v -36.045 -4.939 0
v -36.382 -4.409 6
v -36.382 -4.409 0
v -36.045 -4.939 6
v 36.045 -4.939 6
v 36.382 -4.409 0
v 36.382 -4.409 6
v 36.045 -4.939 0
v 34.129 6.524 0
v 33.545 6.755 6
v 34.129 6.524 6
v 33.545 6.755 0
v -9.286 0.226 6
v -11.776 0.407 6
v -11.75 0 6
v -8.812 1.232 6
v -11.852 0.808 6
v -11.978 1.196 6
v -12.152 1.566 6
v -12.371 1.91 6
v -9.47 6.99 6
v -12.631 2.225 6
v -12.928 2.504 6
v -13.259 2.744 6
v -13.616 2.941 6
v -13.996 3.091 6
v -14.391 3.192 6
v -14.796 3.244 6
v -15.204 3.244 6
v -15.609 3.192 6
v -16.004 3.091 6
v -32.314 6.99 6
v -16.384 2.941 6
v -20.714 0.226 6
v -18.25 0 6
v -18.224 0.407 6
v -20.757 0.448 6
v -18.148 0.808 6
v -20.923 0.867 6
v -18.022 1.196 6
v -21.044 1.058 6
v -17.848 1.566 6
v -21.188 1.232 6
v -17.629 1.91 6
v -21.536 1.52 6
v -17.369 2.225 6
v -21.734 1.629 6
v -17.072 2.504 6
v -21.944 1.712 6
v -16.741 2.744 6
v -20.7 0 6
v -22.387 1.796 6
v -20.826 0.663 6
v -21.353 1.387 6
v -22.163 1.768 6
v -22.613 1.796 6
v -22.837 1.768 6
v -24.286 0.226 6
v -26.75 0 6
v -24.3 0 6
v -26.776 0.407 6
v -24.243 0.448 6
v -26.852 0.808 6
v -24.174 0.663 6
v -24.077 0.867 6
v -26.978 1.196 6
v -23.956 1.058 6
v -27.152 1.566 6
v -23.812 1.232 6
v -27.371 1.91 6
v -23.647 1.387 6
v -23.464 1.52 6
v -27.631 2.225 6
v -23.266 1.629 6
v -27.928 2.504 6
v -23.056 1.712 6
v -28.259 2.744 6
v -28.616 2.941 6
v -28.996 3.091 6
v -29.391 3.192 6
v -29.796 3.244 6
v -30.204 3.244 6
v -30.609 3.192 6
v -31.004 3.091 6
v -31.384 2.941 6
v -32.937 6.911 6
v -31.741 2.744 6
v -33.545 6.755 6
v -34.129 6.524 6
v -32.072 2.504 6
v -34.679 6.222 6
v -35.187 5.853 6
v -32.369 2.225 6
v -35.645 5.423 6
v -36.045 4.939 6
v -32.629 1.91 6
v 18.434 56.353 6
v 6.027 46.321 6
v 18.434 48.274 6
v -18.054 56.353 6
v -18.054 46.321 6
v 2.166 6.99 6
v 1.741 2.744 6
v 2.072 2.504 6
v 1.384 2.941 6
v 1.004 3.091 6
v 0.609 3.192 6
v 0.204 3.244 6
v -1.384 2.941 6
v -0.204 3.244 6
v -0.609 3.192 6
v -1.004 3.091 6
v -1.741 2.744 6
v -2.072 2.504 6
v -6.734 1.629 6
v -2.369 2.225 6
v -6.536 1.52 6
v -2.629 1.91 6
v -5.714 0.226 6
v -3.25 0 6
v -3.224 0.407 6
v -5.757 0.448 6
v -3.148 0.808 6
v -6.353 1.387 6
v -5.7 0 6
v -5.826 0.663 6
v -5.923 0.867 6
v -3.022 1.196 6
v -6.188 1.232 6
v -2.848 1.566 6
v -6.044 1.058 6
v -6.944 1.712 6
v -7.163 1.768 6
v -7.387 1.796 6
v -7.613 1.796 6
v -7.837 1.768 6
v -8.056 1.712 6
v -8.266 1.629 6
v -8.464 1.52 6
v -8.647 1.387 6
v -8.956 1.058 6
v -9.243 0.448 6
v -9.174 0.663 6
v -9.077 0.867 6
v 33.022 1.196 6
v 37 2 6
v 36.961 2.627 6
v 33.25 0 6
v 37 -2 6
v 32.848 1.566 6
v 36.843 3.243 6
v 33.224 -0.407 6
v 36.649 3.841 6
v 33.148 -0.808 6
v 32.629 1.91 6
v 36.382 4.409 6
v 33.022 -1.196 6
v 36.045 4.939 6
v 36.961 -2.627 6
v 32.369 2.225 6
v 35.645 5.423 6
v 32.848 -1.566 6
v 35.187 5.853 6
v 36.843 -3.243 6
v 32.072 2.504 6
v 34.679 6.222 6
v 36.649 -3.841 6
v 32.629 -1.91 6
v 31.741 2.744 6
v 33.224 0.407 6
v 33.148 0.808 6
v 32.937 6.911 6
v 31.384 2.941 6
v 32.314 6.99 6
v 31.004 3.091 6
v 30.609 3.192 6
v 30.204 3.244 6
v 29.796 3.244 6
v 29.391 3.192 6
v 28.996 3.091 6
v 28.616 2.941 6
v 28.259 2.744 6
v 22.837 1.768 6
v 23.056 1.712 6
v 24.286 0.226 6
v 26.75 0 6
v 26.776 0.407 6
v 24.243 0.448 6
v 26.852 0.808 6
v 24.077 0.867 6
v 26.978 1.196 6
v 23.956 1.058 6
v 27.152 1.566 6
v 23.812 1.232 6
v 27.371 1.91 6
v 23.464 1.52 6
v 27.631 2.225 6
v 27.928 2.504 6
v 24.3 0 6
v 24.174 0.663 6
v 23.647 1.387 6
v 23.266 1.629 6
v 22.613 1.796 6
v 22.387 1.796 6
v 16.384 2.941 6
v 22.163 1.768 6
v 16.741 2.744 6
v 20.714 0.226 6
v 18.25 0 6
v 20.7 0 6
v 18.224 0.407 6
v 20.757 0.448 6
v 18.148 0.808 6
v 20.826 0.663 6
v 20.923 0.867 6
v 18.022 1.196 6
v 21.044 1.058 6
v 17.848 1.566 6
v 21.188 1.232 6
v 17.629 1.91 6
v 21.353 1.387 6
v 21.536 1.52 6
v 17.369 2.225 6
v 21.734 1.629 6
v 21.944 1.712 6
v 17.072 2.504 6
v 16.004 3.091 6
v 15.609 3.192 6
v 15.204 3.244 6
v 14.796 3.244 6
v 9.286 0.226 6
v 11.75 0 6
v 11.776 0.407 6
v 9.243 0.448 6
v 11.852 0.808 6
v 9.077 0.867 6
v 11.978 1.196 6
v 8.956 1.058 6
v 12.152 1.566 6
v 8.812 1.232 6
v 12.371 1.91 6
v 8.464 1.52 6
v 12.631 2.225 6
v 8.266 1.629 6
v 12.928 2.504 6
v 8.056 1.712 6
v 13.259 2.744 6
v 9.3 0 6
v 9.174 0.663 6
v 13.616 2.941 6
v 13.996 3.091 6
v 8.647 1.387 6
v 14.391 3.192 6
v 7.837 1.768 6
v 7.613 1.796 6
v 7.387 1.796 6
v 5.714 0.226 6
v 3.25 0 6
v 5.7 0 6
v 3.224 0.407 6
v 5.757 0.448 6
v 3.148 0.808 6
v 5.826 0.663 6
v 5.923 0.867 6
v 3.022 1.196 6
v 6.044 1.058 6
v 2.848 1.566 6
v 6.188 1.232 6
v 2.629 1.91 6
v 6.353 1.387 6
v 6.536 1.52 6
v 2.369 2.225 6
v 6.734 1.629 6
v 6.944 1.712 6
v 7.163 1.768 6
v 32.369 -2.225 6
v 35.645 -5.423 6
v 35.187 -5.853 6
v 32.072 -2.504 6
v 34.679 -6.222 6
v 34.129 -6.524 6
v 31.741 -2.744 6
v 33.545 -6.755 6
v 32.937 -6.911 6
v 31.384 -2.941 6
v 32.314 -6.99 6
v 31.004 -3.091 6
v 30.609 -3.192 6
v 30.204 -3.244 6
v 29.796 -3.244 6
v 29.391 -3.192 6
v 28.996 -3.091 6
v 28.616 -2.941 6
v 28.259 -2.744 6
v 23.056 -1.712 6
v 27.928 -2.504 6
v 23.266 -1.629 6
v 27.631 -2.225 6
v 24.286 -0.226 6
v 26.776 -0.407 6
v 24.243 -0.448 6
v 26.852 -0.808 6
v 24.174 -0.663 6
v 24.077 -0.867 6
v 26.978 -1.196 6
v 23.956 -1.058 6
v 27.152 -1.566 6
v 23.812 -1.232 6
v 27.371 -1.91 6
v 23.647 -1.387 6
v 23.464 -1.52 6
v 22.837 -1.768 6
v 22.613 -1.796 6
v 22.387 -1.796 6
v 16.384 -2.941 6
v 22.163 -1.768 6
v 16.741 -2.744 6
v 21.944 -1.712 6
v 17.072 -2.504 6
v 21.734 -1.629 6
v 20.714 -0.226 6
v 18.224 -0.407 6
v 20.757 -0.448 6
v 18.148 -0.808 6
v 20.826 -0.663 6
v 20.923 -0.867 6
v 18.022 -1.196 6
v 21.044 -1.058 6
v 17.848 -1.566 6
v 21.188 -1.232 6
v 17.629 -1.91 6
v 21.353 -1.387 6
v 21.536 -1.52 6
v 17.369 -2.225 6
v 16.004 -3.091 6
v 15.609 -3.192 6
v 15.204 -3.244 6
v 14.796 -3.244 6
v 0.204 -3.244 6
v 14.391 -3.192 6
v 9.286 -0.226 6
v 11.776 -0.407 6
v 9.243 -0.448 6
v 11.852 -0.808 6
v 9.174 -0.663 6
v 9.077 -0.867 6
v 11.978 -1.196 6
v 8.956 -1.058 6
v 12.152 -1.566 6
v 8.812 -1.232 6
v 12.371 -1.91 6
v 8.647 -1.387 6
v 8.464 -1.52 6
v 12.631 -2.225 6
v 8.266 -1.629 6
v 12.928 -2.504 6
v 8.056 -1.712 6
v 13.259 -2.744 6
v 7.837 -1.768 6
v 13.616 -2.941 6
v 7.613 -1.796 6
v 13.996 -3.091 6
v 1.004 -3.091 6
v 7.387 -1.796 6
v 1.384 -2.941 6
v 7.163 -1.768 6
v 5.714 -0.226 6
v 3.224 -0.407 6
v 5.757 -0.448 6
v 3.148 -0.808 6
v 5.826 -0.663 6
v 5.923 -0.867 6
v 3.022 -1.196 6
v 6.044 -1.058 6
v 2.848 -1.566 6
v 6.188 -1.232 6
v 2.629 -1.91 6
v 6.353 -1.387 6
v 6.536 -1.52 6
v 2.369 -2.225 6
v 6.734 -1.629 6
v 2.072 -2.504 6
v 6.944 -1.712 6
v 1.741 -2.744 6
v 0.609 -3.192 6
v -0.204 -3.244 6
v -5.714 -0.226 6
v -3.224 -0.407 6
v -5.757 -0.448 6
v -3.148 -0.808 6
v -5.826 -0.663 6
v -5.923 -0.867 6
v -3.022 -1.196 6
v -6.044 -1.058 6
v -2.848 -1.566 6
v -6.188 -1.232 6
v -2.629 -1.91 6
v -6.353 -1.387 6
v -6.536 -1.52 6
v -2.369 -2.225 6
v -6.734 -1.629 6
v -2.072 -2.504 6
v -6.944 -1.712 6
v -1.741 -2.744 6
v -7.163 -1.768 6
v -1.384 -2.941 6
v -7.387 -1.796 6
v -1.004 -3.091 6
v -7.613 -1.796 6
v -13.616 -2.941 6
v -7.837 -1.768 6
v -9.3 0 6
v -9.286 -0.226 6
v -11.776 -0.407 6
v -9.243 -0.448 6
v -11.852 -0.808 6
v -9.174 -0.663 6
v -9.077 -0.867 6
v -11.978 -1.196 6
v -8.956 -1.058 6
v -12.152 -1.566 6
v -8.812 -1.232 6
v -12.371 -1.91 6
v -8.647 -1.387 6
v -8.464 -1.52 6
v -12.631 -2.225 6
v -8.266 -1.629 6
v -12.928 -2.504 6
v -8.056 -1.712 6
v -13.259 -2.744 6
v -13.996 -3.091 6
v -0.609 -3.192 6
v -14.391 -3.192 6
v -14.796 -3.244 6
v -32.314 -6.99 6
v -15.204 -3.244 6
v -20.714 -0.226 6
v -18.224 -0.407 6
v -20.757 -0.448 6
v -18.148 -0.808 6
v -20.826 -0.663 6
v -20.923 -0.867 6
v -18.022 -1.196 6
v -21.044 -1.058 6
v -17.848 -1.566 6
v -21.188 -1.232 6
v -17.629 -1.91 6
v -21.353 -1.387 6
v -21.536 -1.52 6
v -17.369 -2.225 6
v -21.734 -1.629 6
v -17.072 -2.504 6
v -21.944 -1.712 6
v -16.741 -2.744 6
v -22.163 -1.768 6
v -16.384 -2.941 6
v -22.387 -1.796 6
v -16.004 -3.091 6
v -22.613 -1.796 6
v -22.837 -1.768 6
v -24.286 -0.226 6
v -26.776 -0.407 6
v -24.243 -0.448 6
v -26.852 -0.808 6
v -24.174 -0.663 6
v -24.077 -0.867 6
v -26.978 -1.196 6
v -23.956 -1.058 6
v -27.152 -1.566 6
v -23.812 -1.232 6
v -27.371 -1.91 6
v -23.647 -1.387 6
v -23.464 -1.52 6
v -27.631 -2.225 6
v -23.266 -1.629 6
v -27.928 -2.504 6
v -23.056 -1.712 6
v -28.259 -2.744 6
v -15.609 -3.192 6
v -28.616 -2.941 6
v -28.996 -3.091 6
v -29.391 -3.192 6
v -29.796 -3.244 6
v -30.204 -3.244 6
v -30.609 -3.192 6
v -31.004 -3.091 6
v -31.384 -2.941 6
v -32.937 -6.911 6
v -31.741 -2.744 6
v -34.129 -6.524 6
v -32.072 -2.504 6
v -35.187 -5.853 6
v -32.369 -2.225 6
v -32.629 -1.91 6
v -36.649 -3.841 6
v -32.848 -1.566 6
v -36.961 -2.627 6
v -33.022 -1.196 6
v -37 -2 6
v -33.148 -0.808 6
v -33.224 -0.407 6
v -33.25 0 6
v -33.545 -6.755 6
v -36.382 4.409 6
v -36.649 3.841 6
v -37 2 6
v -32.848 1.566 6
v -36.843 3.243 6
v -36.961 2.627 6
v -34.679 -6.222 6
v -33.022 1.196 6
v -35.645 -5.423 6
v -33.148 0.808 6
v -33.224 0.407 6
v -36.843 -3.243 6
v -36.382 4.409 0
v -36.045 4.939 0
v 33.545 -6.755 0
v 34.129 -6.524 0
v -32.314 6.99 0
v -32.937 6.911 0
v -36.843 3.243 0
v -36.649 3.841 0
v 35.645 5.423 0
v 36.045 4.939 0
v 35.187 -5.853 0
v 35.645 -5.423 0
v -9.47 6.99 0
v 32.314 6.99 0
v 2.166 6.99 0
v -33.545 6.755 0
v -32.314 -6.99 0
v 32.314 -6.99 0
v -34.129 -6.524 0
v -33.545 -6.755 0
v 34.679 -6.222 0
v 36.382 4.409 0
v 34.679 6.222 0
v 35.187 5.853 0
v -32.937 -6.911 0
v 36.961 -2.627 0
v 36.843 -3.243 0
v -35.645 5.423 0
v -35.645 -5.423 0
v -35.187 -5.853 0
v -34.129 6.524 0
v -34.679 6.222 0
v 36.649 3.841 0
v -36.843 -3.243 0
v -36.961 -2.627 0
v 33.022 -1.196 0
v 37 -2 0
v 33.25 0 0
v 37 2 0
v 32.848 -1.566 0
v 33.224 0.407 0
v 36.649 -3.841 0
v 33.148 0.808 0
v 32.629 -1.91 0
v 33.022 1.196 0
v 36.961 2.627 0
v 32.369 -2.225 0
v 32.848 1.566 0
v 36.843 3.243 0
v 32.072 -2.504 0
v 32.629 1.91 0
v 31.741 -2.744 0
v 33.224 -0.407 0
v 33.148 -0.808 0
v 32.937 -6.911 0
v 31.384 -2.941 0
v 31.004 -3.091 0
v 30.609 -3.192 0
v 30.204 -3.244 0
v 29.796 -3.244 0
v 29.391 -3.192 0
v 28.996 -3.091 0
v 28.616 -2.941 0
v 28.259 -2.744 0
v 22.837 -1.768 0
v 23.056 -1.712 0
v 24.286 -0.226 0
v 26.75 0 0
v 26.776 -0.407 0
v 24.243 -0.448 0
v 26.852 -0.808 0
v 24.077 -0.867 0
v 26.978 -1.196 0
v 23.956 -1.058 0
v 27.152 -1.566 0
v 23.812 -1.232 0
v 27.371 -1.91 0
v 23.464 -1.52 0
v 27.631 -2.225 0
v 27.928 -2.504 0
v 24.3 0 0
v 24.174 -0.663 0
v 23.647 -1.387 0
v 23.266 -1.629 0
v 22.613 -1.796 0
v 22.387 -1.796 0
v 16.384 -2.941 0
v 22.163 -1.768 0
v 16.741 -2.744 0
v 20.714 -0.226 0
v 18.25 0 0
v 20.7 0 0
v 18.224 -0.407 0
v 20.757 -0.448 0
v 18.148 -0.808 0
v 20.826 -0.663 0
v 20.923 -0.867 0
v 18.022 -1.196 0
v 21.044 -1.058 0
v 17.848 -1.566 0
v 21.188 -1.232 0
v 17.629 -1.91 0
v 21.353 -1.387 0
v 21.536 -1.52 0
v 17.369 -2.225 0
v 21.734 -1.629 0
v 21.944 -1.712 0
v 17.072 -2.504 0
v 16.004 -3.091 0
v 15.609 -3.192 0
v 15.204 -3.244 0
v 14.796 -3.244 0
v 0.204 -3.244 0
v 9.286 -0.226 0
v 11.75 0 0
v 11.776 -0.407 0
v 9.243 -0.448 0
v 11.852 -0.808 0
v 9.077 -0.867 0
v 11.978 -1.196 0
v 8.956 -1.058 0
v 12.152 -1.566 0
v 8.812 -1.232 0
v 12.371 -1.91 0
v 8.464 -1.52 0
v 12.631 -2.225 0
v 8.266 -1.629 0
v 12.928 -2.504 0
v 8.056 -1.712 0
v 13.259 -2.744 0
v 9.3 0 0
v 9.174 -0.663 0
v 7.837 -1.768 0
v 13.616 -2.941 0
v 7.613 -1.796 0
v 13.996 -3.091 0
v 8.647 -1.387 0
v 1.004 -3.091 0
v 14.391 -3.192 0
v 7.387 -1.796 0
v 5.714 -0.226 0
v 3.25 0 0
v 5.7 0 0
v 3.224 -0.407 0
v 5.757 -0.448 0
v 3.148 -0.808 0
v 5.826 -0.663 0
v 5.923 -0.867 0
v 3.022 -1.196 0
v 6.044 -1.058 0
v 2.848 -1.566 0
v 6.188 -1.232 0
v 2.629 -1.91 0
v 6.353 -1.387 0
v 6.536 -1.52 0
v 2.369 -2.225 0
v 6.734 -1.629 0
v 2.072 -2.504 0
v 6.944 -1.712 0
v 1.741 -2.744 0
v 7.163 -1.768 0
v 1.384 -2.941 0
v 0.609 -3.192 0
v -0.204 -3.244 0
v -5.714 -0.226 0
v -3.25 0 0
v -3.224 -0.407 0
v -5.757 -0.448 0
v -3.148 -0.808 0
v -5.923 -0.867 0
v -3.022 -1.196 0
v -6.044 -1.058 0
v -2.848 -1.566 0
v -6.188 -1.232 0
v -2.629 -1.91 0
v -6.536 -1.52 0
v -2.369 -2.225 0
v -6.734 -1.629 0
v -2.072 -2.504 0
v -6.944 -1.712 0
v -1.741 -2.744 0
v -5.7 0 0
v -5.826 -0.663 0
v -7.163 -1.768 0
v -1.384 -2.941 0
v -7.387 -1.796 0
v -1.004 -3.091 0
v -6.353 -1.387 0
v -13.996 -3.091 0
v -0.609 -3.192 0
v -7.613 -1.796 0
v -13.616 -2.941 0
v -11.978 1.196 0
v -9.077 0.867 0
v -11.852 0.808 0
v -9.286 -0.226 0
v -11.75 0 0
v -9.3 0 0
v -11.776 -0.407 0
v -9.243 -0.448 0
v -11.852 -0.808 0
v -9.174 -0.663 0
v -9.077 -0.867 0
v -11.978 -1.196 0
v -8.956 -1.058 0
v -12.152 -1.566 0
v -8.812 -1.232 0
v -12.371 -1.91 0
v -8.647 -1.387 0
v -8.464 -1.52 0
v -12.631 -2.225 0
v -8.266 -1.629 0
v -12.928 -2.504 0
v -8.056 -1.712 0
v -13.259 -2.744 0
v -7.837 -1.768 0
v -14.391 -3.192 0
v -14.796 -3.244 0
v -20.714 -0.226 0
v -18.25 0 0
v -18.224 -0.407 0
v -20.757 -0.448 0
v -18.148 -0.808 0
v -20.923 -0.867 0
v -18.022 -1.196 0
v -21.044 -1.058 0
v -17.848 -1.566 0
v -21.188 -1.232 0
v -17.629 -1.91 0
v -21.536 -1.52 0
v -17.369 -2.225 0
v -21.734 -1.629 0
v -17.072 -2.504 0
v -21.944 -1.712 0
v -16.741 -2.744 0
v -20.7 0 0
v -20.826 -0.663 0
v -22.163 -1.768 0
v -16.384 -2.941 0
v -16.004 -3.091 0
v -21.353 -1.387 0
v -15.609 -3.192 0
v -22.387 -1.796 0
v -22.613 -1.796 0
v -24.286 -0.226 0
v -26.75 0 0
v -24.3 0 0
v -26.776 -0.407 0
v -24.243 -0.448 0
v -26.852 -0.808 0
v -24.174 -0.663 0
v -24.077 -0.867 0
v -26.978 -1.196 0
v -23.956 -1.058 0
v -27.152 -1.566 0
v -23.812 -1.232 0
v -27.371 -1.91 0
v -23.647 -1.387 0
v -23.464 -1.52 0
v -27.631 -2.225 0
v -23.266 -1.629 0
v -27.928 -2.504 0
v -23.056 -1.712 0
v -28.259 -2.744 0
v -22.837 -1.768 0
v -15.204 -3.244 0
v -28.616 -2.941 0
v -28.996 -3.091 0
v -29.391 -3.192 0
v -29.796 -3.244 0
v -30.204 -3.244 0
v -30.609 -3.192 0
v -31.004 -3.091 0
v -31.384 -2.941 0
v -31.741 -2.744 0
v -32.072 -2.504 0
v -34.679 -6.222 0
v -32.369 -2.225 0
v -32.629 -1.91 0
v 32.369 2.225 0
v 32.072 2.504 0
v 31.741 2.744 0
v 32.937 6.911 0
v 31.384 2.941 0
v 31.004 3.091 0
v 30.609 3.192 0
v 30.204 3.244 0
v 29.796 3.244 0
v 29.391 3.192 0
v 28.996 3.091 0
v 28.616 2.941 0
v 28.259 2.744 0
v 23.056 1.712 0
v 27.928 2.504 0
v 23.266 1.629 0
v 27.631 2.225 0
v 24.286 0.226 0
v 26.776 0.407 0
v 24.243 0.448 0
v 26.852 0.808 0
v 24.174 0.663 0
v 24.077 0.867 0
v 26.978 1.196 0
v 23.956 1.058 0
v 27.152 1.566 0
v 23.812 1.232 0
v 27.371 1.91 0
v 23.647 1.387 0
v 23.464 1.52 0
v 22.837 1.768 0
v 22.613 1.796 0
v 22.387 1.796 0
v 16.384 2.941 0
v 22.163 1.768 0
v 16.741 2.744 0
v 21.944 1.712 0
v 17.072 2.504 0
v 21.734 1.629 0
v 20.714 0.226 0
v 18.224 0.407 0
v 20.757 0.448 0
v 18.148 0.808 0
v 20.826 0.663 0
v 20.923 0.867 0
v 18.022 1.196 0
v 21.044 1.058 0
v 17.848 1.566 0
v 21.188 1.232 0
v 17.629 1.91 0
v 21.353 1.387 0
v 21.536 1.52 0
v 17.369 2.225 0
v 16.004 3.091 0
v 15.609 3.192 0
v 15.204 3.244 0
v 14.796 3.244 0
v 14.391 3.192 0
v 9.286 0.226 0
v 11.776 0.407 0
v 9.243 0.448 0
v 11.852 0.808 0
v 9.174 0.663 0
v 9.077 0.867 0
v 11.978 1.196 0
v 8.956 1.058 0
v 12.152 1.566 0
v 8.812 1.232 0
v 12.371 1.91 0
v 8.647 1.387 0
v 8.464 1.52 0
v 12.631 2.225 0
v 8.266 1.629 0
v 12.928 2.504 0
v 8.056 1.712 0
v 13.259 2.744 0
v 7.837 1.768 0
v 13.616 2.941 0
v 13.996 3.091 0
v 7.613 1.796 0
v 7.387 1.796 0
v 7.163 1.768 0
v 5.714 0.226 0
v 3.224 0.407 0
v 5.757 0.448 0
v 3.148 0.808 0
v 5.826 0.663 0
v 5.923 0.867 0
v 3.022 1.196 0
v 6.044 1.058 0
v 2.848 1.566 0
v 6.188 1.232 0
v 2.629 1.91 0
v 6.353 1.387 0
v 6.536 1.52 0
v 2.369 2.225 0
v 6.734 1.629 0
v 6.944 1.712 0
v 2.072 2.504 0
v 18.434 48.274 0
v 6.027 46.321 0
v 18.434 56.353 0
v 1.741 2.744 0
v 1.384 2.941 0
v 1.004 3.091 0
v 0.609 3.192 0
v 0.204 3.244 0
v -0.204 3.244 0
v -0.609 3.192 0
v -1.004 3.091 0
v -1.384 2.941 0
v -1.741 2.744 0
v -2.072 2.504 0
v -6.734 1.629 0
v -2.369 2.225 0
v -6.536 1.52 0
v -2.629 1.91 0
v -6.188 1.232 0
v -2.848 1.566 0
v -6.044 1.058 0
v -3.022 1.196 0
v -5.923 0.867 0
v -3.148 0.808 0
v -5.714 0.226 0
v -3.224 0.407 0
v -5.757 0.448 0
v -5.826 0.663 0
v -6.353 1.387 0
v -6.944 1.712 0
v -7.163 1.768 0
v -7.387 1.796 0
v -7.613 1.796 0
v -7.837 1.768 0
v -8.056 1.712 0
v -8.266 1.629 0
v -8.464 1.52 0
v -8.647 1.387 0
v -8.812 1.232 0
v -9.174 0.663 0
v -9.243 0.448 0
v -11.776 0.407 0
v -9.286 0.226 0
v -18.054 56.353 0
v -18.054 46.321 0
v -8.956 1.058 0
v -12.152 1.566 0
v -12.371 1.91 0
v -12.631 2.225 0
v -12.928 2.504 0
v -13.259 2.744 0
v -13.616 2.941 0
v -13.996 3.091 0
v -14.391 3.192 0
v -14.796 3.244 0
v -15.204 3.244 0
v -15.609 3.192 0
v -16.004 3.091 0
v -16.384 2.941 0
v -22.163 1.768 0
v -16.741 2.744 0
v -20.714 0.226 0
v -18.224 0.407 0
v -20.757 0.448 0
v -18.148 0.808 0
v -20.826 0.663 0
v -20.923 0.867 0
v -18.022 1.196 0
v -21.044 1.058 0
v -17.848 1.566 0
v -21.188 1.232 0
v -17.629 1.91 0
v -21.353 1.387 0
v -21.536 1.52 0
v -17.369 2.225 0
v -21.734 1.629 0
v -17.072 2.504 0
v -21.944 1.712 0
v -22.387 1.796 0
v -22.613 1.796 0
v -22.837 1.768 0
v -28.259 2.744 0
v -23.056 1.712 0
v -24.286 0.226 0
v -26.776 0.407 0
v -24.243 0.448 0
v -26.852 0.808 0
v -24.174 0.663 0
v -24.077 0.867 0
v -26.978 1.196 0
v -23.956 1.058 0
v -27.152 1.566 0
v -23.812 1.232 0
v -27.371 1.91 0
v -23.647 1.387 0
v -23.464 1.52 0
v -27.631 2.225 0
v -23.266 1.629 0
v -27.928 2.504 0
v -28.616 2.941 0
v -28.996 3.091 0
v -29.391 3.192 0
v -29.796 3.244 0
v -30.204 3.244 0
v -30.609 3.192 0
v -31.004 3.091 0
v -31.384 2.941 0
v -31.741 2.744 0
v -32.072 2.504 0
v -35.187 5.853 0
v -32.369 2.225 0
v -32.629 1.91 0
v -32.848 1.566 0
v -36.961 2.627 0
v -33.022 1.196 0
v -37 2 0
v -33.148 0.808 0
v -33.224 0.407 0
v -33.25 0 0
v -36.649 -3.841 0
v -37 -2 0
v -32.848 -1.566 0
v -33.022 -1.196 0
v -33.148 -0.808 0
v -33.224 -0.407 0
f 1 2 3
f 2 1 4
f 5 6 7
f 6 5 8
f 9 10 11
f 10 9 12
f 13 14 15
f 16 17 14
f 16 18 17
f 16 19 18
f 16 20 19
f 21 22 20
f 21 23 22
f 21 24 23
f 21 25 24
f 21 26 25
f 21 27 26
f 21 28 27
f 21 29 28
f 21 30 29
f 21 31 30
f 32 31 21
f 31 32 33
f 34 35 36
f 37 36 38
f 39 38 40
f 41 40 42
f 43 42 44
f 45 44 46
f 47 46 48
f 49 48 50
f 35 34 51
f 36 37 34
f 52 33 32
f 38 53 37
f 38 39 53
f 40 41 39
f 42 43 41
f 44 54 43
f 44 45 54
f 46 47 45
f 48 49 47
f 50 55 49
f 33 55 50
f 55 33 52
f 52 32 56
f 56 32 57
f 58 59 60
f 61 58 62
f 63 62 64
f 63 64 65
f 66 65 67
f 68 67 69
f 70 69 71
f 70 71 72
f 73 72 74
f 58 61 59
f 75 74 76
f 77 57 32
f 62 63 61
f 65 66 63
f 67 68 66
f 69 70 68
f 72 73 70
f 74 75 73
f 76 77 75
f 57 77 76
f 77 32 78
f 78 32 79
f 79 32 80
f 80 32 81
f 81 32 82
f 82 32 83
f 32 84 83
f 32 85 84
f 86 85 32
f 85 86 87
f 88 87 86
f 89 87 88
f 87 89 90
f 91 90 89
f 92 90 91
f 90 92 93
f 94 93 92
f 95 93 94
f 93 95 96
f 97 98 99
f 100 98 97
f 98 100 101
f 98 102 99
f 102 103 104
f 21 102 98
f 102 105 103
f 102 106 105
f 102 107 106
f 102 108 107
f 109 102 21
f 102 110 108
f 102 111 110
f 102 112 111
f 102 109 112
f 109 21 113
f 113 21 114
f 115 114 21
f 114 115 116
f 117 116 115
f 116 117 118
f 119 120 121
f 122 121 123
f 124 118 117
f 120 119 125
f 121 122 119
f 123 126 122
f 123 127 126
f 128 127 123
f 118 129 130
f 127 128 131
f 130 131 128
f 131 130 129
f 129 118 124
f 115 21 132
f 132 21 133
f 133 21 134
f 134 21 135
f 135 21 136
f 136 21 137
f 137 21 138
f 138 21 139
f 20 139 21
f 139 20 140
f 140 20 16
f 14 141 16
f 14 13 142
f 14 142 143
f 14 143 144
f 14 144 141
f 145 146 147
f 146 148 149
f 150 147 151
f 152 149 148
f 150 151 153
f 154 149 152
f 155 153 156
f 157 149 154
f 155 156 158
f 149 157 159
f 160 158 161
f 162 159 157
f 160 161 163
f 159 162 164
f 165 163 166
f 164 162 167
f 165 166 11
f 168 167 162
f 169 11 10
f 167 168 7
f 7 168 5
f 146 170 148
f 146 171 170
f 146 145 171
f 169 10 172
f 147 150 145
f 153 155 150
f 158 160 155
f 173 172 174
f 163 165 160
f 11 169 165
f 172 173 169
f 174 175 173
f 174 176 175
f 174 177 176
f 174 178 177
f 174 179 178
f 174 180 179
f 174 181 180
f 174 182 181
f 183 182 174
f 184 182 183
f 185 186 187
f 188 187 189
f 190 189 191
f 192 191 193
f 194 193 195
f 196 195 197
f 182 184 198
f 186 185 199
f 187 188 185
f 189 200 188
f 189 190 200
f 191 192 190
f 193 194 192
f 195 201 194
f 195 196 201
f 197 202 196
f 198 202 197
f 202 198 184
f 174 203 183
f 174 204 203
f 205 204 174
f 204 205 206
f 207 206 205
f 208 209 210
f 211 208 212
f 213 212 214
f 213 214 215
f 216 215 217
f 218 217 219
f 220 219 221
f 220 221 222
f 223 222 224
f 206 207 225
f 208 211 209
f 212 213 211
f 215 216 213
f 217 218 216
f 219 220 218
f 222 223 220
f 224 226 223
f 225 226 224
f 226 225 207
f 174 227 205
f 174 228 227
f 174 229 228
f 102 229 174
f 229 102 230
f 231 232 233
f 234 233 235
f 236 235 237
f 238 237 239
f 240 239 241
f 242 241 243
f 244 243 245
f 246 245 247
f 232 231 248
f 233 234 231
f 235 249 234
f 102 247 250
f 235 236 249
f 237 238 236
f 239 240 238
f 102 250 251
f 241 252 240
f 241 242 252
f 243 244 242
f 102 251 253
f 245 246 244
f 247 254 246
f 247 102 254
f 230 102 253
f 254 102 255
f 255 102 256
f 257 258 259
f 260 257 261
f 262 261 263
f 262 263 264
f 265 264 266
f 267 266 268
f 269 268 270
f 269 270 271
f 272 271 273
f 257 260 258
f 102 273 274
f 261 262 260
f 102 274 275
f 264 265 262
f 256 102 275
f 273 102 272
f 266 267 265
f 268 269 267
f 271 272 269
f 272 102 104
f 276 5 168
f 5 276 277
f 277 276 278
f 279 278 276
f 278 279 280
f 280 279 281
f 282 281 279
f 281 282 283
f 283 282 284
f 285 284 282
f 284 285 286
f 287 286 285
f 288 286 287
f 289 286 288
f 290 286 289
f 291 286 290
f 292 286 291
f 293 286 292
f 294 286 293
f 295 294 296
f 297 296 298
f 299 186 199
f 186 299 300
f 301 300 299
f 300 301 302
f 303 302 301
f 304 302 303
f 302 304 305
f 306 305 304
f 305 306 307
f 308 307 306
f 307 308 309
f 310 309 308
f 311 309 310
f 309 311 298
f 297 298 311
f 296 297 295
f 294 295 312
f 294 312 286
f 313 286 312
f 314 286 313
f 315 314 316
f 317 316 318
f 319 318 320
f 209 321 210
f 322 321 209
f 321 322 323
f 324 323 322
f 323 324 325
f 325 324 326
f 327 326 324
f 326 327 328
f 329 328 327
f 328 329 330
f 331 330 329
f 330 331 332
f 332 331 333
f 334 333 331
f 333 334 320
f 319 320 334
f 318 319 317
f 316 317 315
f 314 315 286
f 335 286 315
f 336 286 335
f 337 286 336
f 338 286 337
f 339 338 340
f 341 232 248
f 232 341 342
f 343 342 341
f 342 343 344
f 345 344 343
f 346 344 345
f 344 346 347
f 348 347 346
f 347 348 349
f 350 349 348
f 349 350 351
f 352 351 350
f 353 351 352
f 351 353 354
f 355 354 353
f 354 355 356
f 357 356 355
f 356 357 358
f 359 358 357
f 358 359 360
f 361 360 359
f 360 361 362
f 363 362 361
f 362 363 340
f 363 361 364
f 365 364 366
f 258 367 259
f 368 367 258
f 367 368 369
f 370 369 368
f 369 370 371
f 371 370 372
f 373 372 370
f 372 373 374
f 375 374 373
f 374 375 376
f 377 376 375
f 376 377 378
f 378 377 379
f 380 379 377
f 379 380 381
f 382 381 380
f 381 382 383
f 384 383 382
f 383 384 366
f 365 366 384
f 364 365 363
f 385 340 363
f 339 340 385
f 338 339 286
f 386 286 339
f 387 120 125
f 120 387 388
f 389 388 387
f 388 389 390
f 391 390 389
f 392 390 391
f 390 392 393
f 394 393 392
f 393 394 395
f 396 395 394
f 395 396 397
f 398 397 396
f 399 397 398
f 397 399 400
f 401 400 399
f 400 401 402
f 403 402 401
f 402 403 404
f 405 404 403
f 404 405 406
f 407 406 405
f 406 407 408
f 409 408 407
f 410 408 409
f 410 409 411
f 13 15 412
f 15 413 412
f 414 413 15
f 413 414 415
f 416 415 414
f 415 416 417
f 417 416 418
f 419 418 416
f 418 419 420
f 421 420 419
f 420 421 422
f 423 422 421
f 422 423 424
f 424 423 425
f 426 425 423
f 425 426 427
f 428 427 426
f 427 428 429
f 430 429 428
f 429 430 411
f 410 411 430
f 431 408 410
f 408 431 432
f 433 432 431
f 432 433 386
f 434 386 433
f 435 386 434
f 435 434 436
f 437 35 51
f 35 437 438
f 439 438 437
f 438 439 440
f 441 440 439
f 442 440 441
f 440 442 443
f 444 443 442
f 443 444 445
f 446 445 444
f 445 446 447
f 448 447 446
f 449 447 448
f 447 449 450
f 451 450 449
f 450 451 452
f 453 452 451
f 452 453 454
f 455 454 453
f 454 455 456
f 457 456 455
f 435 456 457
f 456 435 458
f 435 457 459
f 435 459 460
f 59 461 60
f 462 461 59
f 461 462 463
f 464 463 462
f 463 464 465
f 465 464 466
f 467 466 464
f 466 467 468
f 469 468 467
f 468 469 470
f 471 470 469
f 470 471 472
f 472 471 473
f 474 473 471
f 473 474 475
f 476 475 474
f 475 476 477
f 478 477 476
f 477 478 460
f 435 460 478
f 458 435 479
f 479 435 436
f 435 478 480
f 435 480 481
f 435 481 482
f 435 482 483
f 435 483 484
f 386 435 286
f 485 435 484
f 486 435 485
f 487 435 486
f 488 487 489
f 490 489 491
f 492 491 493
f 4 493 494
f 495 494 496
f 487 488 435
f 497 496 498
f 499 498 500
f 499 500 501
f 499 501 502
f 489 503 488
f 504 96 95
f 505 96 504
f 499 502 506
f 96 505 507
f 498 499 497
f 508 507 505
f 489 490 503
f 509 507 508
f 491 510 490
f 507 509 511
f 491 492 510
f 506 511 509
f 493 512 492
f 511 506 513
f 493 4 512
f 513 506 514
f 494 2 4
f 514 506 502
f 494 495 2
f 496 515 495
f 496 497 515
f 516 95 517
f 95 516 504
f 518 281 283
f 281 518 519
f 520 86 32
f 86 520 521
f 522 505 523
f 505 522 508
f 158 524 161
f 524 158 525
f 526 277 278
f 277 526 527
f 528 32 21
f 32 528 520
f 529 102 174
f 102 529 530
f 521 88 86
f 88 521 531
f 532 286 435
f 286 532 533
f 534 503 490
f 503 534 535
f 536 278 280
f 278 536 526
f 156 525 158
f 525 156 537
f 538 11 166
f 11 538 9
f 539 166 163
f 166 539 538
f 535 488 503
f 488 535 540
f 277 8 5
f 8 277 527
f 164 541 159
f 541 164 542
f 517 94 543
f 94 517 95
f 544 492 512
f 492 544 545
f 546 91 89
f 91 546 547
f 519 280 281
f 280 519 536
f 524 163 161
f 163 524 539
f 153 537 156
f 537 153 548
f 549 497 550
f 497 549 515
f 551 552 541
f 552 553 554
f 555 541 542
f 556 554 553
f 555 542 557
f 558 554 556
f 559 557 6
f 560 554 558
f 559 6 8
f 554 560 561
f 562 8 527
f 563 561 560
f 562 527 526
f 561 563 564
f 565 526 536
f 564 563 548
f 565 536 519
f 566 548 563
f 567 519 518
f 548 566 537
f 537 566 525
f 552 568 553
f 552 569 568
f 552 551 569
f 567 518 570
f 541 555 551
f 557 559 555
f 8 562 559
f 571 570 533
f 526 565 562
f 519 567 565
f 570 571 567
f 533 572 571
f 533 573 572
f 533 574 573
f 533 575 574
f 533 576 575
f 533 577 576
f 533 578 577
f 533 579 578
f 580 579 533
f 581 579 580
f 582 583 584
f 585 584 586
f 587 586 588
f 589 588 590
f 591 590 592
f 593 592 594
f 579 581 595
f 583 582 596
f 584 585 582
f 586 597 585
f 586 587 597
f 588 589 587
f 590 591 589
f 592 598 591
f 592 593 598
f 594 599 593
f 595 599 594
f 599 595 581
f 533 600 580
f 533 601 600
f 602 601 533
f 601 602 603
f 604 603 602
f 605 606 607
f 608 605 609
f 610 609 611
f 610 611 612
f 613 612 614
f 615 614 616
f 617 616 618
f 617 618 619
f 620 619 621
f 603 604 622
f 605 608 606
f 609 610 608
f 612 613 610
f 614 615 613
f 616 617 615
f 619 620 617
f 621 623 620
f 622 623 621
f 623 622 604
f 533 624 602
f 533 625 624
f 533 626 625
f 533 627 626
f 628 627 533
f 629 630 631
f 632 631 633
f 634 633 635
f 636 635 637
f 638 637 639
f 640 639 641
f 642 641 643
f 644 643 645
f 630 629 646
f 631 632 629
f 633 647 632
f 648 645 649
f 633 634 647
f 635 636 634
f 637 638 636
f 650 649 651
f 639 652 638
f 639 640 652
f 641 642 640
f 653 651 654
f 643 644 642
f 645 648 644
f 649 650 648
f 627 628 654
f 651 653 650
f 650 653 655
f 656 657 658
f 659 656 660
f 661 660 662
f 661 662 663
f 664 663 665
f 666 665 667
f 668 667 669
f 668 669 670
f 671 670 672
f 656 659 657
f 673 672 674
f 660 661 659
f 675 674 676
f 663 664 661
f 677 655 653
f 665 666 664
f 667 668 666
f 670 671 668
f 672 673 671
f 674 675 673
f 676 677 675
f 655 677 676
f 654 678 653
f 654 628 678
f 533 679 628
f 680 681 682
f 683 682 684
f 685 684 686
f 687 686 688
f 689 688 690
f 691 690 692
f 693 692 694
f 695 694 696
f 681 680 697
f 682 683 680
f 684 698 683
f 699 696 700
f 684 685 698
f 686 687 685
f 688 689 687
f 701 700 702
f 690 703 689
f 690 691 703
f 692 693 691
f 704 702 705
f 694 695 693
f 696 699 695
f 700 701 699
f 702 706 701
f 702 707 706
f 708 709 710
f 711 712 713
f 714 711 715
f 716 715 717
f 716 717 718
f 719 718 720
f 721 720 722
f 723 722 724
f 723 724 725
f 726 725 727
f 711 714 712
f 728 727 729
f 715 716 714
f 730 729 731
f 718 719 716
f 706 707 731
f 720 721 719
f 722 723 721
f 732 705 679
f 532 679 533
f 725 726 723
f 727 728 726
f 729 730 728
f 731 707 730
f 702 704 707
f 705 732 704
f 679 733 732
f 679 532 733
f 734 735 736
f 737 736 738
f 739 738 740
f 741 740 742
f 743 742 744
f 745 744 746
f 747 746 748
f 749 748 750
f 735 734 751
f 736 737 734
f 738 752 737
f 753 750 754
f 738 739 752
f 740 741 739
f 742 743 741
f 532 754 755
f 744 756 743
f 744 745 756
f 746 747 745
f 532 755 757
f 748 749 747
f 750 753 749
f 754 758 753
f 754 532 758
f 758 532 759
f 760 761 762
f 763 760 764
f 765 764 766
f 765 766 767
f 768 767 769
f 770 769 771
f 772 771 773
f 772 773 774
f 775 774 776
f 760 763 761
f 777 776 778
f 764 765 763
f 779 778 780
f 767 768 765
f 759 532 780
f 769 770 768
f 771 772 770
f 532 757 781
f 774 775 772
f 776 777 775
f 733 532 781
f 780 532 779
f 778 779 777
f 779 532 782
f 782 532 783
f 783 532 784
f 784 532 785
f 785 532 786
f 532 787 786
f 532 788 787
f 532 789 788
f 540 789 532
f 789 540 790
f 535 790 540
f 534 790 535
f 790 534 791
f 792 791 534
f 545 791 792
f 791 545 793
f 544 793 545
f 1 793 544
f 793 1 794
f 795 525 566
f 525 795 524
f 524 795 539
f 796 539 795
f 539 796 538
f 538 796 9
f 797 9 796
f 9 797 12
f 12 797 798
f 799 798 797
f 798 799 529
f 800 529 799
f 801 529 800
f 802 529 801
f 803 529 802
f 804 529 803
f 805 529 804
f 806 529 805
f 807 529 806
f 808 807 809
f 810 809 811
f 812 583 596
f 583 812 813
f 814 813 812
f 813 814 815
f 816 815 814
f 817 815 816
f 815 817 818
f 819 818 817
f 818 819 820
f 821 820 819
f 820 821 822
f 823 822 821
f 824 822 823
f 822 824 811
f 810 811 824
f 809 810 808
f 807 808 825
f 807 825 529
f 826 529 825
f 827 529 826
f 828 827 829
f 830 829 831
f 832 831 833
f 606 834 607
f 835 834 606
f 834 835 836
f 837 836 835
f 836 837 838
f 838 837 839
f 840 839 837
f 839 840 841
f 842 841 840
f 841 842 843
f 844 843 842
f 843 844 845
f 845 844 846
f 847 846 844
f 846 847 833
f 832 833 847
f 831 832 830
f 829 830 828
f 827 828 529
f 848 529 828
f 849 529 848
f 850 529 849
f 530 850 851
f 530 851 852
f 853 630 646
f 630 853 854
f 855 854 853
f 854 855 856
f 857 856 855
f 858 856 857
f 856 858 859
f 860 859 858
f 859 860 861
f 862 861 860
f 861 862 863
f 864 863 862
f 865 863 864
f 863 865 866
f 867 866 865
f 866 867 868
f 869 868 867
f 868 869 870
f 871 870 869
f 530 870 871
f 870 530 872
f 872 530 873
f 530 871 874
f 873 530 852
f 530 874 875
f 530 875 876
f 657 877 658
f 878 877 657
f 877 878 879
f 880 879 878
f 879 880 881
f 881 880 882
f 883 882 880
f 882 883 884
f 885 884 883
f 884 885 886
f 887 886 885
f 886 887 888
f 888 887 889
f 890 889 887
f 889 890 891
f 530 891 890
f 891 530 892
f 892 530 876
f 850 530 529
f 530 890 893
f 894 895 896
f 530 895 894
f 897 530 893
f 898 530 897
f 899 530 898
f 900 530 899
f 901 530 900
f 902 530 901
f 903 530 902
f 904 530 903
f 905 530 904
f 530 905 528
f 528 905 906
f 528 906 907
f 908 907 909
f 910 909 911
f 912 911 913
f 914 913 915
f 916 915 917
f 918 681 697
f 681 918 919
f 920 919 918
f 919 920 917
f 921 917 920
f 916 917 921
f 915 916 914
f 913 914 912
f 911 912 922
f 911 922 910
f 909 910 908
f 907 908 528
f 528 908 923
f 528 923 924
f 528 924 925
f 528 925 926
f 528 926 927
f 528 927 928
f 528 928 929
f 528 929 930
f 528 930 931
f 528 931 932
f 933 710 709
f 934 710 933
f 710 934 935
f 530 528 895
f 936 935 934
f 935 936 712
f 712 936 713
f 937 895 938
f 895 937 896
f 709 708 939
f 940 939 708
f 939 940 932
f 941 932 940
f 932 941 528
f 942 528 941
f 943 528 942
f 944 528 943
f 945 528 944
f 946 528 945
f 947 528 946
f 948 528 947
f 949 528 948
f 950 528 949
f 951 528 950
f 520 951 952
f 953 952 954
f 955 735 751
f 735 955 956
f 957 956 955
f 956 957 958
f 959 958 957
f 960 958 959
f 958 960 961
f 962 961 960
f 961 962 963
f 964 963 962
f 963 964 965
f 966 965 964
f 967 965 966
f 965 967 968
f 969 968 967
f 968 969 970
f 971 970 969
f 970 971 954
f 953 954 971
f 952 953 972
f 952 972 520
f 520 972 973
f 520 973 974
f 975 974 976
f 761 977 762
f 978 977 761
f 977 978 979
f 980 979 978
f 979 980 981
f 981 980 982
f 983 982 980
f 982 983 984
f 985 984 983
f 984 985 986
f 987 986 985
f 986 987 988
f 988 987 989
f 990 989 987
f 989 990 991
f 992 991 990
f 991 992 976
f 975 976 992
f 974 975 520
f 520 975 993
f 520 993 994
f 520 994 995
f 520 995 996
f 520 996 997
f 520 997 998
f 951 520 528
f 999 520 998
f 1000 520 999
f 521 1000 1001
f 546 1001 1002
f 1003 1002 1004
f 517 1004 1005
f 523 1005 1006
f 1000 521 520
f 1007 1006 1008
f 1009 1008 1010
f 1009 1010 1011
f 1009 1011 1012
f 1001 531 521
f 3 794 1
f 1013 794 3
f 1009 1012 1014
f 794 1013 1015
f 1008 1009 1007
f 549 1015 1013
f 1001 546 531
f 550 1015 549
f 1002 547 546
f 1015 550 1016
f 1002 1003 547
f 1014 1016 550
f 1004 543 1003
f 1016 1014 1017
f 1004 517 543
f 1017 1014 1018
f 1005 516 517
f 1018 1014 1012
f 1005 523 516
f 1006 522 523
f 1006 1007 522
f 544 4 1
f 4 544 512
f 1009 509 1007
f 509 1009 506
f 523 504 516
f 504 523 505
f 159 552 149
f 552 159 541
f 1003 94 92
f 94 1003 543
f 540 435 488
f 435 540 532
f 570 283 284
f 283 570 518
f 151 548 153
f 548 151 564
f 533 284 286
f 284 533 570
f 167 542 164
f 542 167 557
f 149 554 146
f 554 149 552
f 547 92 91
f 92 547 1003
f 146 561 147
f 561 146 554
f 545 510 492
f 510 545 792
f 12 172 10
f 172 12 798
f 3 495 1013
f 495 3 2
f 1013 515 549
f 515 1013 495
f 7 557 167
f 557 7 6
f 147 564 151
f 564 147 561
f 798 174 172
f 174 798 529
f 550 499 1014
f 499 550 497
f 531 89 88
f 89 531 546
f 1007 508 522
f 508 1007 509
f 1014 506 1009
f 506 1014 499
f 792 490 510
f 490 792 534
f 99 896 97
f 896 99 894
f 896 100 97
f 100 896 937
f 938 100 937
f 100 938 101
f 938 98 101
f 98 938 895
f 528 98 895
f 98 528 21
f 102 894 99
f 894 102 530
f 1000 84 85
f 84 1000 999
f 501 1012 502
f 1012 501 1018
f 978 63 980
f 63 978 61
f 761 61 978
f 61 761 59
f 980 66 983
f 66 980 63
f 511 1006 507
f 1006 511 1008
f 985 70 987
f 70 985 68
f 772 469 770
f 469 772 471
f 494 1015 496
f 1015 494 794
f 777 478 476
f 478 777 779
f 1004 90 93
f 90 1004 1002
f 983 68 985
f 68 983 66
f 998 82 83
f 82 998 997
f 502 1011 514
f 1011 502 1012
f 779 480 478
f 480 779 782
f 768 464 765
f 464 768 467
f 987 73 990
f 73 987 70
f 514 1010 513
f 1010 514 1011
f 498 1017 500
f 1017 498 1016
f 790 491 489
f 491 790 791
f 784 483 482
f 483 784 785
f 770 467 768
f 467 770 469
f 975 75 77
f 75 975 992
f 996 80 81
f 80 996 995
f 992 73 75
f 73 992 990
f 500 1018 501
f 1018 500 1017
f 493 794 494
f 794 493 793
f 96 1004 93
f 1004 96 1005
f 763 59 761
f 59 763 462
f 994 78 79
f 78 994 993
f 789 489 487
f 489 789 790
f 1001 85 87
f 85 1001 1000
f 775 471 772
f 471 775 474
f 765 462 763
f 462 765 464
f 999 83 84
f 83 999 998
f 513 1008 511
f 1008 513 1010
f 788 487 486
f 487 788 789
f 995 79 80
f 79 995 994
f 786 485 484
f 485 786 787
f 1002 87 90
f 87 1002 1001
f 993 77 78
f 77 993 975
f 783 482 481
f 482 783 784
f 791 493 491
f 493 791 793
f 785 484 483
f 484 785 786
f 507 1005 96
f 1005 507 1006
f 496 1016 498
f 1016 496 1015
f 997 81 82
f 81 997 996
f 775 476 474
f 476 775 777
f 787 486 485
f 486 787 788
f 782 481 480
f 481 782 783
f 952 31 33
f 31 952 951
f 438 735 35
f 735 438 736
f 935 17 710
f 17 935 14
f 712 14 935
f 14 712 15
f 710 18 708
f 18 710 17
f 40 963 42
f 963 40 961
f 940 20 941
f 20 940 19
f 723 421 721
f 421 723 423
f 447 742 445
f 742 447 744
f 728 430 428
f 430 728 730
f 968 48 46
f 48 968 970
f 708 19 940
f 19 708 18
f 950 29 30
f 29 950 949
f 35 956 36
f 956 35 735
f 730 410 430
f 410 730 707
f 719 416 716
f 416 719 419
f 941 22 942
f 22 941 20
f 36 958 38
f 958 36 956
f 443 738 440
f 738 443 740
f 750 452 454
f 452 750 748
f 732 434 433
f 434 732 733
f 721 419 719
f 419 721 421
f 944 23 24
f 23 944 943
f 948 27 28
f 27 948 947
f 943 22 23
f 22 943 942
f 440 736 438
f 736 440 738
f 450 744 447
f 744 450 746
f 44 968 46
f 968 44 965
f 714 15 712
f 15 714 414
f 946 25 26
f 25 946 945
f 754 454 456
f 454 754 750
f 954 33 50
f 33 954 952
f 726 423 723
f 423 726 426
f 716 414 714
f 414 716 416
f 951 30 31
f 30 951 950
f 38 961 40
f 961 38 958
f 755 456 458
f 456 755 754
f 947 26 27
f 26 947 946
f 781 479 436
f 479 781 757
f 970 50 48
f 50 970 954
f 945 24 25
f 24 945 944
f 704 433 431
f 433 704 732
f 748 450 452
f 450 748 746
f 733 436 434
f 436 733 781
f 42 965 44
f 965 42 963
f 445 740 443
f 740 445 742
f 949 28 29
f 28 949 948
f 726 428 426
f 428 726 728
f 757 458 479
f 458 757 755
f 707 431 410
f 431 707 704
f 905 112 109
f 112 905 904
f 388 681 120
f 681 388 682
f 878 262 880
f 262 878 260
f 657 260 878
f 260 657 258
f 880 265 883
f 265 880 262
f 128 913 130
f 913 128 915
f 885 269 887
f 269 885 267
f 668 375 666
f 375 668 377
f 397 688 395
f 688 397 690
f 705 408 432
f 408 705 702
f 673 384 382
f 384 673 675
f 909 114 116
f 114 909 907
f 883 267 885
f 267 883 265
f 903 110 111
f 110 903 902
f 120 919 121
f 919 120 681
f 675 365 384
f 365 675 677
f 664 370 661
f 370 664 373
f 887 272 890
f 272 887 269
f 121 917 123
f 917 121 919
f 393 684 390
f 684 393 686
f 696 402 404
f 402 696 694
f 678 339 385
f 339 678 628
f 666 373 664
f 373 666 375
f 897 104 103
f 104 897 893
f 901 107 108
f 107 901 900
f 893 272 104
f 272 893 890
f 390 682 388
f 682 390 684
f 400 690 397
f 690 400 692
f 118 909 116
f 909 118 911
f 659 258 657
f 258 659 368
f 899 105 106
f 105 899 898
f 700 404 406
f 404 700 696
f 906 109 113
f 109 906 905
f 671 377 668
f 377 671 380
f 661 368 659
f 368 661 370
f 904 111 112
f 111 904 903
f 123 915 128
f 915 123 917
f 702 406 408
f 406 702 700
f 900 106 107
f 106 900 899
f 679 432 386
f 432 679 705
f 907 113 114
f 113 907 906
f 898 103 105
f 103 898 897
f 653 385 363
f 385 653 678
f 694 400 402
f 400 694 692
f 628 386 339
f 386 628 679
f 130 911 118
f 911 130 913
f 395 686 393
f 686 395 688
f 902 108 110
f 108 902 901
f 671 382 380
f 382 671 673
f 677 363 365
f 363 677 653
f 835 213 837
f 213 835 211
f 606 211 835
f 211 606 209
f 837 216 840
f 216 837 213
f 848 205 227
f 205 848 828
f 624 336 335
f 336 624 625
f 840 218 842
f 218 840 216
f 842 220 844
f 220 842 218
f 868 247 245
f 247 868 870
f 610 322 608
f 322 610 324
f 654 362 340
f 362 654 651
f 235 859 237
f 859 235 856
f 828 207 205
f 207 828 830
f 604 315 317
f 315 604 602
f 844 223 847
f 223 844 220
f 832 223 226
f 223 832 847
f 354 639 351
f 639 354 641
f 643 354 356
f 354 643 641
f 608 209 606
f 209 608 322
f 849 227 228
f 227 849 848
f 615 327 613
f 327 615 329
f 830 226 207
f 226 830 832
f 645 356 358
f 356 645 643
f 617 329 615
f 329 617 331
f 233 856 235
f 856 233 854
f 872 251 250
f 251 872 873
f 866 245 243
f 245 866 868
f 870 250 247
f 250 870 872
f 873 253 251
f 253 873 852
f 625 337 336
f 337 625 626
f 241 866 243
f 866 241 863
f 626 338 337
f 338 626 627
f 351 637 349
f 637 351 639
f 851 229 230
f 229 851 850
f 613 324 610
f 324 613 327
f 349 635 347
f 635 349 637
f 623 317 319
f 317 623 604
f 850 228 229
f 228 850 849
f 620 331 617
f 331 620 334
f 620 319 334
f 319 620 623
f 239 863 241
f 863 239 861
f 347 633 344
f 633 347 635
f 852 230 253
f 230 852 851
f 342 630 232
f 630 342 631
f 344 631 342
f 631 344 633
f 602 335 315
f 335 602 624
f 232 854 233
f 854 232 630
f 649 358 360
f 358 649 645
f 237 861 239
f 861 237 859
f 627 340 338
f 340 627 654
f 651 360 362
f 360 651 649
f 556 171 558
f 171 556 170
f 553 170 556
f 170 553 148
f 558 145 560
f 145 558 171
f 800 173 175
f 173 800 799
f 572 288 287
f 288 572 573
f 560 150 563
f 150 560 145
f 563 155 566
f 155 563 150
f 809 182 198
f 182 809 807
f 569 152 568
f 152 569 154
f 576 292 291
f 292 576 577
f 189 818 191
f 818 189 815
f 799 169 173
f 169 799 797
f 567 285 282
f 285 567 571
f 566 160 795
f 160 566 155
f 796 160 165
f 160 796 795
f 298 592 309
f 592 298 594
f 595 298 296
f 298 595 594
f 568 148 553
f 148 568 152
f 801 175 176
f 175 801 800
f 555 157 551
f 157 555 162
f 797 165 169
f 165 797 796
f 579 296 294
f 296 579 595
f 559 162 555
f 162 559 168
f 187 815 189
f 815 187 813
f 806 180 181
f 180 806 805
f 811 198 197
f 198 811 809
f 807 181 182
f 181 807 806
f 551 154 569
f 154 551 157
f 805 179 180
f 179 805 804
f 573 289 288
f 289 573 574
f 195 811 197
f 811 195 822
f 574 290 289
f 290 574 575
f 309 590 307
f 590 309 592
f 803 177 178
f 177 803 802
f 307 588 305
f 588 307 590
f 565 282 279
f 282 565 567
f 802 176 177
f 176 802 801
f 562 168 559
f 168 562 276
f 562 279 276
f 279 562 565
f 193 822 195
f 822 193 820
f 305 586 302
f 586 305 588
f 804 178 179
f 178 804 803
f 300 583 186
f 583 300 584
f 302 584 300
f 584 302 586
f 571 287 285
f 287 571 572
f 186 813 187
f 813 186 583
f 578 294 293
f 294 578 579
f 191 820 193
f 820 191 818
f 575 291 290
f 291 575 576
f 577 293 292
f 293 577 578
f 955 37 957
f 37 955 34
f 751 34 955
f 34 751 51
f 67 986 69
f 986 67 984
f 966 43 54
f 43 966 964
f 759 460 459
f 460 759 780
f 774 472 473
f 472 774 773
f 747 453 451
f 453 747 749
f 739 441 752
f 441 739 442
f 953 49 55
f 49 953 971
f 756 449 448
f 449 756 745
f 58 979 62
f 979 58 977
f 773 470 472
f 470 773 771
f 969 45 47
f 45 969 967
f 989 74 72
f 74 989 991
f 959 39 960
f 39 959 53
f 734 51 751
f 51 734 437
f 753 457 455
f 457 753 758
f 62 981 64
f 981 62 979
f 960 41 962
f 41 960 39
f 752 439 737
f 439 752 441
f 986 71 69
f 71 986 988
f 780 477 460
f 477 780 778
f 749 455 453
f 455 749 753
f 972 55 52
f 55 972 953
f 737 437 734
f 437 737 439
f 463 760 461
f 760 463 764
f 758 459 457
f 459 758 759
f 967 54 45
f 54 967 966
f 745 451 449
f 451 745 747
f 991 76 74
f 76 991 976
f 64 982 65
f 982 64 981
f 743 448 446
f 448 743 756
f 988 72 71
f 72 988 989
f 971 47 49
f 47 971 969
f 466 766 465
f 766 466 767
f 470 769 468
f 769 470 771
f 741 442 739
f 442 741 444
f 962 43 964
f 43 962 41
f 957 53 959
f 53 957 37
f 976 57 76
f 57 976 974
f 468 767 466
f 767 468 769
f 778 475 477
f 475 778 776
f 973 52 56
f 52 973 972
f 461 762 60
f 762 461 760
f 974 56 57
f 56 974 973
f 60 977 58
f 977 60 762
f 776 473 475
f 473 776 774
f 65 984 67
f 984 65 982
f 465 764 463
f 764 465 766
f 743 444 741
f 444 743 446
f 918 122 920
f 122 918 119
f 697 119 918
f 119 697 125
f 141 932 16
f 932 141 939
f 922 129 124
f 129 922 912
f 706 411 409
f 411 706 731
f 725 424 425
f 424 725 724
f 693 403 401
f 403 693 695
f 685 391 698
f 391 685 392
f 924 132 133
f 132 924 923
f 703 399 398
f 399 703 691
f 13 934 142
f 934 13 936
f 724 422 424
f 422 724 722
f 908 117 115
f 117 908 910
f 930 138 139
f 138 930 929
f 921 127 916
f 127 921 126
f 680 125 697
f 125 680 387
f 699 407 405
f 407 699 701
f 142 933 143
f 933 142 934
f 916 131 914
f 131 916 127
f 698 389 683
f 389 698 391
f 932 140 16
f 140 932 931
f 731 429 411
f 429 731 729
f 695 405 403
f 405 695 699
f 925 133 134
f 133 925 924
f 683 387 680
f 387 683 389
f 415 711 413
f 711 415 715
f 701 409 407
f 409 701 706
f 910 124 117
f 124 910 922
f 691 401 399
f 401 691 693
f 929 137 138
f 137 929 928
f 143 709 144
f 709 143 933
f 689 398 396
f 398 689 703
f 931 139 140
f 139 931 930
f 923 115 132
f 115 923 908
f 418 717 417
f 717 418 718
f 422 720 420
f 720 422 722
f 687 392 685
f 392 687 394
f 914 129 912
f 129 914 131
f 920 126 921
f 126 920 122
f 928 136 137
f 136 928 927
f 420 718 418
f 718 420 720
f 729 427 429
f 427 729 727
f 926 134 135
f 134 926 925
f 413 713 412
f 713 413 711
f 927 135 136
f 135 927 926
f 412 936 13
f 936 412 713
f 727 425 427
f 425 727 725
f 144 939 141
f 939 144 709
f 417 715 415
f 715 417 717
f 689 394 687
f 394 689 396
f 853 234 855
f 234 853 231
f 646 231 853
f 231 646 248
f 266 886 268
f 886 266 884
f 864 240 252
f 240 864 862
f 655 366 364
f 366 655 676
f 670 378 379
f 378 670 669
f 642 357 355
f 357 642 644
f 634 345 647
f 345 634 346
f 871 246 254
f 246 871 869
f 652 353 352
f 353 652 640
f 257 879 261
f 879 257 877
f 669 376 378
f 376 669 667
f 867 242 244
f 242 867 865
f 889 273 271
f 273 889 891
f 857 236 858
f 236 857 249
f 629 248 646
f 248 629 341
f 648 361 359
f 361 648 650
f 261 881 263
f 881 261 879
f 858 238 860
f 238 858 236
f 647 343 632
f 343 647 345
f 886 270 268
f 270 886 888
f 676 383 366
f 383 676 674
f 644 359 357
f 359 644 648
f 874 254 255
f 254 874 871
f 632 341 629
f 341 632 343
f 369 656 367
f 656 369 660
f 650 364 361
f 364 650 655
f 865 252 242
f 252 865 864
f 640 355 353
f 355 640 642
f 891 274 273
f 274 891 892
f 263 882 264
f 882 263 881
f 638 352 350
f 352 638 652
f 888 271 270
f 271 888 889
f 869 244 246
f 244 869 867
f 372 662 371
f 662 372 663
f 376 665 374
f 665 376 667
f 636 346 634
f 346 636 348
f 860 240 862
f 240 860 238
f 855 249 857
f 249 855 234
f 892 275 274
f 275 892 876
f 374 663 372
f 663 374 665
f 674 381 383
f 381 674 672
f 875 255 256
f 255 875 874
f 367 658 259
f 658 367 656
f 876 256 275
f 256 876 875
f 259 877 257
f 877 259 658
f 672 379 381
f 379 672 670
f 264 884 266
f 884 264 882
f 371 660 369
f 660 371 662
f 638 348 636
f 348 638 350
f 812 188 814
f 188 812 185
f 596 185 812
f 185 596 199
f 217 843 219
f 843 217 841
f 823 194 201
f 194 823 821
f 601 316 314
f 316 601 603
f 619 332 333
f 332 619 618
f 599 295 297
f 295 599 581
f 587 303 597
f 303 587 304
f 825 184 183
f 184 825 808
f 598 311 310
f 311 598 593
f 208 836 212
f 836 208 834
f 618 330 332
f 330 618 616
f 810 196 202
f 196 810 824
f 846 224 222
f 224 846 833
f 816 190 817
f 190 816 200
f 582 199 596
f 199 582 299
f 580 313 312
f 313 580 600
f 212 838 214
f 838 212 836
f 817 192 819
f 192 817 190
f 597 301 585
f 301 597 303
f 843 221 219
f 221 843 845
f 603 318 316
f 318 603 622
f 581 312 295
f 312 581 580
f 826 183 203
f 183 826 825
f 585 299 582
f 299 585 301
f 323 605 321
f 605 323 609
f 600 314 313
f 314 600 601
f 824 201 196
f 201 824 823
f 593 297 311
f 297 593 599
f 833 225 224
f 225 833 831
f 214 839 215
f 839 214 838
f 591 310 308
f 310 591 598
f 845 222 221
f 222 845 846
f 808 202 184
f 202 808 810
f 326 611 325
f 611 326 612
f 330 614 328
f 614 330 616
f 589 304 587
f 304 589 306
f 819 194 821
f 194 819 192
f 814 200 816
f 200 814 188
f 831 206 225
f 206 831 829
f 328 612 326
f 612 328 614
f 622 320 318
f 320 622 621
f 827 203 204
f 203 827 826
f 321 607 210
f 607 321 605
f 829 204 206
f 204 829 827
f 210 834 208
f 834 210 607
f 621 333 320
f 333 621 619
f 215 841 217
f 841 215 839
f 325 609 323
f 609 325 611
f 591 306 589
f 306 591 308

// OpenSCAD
$fn = 50;


difference() {
	union() {
		hull() {
			translate(v = [-32.0000000000, 2.0000000000, 0]) {
				cylinder(h = 6, r = 5);
			}
			translate(v = [32.0000000000, 2.0000000000, 0]) {
				cylinder(h = 6, r = 5);
			}
			translate(v = [-32.0000000000, -2.0000000000, 0]) {
				cylinder(h = 6, r = 5);
			}
			translate(v = [32.0000000000, -2.0000000000, 0]) {
				cylinder(h = 6, r = 5);
			}
		}
		translate(v = [0, 55, 0]) {
			linear_extrude(height = 6) {
				text(font = "DejaVu Sans Mono:style=Bold", halign = "center", size = 57.0000000000, text = "7", valign = "top");
			}
		}
	}
	union() {
		translate(v = [-30.0000000000, 0.0000000000, 0]) {
			translate(v = [0, 0, -100]) {
				cylinder(h = 200, r = 3.2500000000);
			}
		}
		translate(v = [-15.0000000000, 0.0000000000, 0]) {
			translate(v = [0, 0, -100]) {
				cylinder(h = 200, r = 3.2500000000);
			}
		}
		translate(v = [0, 0, -100]) {
			cylinder(h = 200, r = 3.2500000000);
		}
		translate(v = [15.0000000000, 0.0000000000, 0]) {
			translate(v = [0, 0, -100]) {
				cylinder(h = 200, r = 3.2500000000);
			}
		}
		translate(v = [30.0000000000, 0.0000000000, 0]) {
			translate(v = [0, 0, -100]) {
				cylinder(h = 200, r = 3.2500000000);
			}
		}
		translate(v = [-30.0000000000, 0.0000000000, 0]) {
			translate(v = [0, 0, -100]) {
				cylinder(h = 200, r = 1.8000000000);
			}
		}
		translate(v = [-22.5000000000, 0.0000000000, 0]) {
			translate(v = [0, 0, -100]) {
				cylinder(h = 200, r = 1.8000000000);
			}
		}
		translate(v = [-15.0000000000, 0.0000000000, 0]) {
			translate(v = [0, 0, -100]) {
				cylinder(h = 200, r = 1.8000000000);
			}
		}
		translate(v = [-7.5000000000, 0.0000000000, 0]) {
			translate(v = [0, 0, -100]) {
				cylinder(h = 200, r = 1.8000000000);
			}
		}
		translate(v = [0, 0, -100]) {
			cylinder(h = 200, r = 1.8000000000);
		}
		translate(v = [7.5000000000, 0.0000000000, 0]) {
			translate(v = [0, 0, -100]) {
				cylinder(h = 200, r = 1.8000000000);
			}
		}
		translate(v = [15.0000000000, 0.0000000000, 0]) {
			translate(v = [0, 0, -100]) {
				cylinder(h = 200, r = 1.8000000000);
			}
		}
		translate(v = [22.5000000000, 0.0000000000, 0]) {
			translate(v = [0, 0, -100]) {
				cylinder(h = 200, r = 1.8000000000);
			}
		}
		translate(v = [30.0000000000, 0.0000000000, 0]) {
			translate(v = [0, 0, -100]) {
				cylinder(h = 200, r = 1.8000000000);
			}
		}
	}
}
